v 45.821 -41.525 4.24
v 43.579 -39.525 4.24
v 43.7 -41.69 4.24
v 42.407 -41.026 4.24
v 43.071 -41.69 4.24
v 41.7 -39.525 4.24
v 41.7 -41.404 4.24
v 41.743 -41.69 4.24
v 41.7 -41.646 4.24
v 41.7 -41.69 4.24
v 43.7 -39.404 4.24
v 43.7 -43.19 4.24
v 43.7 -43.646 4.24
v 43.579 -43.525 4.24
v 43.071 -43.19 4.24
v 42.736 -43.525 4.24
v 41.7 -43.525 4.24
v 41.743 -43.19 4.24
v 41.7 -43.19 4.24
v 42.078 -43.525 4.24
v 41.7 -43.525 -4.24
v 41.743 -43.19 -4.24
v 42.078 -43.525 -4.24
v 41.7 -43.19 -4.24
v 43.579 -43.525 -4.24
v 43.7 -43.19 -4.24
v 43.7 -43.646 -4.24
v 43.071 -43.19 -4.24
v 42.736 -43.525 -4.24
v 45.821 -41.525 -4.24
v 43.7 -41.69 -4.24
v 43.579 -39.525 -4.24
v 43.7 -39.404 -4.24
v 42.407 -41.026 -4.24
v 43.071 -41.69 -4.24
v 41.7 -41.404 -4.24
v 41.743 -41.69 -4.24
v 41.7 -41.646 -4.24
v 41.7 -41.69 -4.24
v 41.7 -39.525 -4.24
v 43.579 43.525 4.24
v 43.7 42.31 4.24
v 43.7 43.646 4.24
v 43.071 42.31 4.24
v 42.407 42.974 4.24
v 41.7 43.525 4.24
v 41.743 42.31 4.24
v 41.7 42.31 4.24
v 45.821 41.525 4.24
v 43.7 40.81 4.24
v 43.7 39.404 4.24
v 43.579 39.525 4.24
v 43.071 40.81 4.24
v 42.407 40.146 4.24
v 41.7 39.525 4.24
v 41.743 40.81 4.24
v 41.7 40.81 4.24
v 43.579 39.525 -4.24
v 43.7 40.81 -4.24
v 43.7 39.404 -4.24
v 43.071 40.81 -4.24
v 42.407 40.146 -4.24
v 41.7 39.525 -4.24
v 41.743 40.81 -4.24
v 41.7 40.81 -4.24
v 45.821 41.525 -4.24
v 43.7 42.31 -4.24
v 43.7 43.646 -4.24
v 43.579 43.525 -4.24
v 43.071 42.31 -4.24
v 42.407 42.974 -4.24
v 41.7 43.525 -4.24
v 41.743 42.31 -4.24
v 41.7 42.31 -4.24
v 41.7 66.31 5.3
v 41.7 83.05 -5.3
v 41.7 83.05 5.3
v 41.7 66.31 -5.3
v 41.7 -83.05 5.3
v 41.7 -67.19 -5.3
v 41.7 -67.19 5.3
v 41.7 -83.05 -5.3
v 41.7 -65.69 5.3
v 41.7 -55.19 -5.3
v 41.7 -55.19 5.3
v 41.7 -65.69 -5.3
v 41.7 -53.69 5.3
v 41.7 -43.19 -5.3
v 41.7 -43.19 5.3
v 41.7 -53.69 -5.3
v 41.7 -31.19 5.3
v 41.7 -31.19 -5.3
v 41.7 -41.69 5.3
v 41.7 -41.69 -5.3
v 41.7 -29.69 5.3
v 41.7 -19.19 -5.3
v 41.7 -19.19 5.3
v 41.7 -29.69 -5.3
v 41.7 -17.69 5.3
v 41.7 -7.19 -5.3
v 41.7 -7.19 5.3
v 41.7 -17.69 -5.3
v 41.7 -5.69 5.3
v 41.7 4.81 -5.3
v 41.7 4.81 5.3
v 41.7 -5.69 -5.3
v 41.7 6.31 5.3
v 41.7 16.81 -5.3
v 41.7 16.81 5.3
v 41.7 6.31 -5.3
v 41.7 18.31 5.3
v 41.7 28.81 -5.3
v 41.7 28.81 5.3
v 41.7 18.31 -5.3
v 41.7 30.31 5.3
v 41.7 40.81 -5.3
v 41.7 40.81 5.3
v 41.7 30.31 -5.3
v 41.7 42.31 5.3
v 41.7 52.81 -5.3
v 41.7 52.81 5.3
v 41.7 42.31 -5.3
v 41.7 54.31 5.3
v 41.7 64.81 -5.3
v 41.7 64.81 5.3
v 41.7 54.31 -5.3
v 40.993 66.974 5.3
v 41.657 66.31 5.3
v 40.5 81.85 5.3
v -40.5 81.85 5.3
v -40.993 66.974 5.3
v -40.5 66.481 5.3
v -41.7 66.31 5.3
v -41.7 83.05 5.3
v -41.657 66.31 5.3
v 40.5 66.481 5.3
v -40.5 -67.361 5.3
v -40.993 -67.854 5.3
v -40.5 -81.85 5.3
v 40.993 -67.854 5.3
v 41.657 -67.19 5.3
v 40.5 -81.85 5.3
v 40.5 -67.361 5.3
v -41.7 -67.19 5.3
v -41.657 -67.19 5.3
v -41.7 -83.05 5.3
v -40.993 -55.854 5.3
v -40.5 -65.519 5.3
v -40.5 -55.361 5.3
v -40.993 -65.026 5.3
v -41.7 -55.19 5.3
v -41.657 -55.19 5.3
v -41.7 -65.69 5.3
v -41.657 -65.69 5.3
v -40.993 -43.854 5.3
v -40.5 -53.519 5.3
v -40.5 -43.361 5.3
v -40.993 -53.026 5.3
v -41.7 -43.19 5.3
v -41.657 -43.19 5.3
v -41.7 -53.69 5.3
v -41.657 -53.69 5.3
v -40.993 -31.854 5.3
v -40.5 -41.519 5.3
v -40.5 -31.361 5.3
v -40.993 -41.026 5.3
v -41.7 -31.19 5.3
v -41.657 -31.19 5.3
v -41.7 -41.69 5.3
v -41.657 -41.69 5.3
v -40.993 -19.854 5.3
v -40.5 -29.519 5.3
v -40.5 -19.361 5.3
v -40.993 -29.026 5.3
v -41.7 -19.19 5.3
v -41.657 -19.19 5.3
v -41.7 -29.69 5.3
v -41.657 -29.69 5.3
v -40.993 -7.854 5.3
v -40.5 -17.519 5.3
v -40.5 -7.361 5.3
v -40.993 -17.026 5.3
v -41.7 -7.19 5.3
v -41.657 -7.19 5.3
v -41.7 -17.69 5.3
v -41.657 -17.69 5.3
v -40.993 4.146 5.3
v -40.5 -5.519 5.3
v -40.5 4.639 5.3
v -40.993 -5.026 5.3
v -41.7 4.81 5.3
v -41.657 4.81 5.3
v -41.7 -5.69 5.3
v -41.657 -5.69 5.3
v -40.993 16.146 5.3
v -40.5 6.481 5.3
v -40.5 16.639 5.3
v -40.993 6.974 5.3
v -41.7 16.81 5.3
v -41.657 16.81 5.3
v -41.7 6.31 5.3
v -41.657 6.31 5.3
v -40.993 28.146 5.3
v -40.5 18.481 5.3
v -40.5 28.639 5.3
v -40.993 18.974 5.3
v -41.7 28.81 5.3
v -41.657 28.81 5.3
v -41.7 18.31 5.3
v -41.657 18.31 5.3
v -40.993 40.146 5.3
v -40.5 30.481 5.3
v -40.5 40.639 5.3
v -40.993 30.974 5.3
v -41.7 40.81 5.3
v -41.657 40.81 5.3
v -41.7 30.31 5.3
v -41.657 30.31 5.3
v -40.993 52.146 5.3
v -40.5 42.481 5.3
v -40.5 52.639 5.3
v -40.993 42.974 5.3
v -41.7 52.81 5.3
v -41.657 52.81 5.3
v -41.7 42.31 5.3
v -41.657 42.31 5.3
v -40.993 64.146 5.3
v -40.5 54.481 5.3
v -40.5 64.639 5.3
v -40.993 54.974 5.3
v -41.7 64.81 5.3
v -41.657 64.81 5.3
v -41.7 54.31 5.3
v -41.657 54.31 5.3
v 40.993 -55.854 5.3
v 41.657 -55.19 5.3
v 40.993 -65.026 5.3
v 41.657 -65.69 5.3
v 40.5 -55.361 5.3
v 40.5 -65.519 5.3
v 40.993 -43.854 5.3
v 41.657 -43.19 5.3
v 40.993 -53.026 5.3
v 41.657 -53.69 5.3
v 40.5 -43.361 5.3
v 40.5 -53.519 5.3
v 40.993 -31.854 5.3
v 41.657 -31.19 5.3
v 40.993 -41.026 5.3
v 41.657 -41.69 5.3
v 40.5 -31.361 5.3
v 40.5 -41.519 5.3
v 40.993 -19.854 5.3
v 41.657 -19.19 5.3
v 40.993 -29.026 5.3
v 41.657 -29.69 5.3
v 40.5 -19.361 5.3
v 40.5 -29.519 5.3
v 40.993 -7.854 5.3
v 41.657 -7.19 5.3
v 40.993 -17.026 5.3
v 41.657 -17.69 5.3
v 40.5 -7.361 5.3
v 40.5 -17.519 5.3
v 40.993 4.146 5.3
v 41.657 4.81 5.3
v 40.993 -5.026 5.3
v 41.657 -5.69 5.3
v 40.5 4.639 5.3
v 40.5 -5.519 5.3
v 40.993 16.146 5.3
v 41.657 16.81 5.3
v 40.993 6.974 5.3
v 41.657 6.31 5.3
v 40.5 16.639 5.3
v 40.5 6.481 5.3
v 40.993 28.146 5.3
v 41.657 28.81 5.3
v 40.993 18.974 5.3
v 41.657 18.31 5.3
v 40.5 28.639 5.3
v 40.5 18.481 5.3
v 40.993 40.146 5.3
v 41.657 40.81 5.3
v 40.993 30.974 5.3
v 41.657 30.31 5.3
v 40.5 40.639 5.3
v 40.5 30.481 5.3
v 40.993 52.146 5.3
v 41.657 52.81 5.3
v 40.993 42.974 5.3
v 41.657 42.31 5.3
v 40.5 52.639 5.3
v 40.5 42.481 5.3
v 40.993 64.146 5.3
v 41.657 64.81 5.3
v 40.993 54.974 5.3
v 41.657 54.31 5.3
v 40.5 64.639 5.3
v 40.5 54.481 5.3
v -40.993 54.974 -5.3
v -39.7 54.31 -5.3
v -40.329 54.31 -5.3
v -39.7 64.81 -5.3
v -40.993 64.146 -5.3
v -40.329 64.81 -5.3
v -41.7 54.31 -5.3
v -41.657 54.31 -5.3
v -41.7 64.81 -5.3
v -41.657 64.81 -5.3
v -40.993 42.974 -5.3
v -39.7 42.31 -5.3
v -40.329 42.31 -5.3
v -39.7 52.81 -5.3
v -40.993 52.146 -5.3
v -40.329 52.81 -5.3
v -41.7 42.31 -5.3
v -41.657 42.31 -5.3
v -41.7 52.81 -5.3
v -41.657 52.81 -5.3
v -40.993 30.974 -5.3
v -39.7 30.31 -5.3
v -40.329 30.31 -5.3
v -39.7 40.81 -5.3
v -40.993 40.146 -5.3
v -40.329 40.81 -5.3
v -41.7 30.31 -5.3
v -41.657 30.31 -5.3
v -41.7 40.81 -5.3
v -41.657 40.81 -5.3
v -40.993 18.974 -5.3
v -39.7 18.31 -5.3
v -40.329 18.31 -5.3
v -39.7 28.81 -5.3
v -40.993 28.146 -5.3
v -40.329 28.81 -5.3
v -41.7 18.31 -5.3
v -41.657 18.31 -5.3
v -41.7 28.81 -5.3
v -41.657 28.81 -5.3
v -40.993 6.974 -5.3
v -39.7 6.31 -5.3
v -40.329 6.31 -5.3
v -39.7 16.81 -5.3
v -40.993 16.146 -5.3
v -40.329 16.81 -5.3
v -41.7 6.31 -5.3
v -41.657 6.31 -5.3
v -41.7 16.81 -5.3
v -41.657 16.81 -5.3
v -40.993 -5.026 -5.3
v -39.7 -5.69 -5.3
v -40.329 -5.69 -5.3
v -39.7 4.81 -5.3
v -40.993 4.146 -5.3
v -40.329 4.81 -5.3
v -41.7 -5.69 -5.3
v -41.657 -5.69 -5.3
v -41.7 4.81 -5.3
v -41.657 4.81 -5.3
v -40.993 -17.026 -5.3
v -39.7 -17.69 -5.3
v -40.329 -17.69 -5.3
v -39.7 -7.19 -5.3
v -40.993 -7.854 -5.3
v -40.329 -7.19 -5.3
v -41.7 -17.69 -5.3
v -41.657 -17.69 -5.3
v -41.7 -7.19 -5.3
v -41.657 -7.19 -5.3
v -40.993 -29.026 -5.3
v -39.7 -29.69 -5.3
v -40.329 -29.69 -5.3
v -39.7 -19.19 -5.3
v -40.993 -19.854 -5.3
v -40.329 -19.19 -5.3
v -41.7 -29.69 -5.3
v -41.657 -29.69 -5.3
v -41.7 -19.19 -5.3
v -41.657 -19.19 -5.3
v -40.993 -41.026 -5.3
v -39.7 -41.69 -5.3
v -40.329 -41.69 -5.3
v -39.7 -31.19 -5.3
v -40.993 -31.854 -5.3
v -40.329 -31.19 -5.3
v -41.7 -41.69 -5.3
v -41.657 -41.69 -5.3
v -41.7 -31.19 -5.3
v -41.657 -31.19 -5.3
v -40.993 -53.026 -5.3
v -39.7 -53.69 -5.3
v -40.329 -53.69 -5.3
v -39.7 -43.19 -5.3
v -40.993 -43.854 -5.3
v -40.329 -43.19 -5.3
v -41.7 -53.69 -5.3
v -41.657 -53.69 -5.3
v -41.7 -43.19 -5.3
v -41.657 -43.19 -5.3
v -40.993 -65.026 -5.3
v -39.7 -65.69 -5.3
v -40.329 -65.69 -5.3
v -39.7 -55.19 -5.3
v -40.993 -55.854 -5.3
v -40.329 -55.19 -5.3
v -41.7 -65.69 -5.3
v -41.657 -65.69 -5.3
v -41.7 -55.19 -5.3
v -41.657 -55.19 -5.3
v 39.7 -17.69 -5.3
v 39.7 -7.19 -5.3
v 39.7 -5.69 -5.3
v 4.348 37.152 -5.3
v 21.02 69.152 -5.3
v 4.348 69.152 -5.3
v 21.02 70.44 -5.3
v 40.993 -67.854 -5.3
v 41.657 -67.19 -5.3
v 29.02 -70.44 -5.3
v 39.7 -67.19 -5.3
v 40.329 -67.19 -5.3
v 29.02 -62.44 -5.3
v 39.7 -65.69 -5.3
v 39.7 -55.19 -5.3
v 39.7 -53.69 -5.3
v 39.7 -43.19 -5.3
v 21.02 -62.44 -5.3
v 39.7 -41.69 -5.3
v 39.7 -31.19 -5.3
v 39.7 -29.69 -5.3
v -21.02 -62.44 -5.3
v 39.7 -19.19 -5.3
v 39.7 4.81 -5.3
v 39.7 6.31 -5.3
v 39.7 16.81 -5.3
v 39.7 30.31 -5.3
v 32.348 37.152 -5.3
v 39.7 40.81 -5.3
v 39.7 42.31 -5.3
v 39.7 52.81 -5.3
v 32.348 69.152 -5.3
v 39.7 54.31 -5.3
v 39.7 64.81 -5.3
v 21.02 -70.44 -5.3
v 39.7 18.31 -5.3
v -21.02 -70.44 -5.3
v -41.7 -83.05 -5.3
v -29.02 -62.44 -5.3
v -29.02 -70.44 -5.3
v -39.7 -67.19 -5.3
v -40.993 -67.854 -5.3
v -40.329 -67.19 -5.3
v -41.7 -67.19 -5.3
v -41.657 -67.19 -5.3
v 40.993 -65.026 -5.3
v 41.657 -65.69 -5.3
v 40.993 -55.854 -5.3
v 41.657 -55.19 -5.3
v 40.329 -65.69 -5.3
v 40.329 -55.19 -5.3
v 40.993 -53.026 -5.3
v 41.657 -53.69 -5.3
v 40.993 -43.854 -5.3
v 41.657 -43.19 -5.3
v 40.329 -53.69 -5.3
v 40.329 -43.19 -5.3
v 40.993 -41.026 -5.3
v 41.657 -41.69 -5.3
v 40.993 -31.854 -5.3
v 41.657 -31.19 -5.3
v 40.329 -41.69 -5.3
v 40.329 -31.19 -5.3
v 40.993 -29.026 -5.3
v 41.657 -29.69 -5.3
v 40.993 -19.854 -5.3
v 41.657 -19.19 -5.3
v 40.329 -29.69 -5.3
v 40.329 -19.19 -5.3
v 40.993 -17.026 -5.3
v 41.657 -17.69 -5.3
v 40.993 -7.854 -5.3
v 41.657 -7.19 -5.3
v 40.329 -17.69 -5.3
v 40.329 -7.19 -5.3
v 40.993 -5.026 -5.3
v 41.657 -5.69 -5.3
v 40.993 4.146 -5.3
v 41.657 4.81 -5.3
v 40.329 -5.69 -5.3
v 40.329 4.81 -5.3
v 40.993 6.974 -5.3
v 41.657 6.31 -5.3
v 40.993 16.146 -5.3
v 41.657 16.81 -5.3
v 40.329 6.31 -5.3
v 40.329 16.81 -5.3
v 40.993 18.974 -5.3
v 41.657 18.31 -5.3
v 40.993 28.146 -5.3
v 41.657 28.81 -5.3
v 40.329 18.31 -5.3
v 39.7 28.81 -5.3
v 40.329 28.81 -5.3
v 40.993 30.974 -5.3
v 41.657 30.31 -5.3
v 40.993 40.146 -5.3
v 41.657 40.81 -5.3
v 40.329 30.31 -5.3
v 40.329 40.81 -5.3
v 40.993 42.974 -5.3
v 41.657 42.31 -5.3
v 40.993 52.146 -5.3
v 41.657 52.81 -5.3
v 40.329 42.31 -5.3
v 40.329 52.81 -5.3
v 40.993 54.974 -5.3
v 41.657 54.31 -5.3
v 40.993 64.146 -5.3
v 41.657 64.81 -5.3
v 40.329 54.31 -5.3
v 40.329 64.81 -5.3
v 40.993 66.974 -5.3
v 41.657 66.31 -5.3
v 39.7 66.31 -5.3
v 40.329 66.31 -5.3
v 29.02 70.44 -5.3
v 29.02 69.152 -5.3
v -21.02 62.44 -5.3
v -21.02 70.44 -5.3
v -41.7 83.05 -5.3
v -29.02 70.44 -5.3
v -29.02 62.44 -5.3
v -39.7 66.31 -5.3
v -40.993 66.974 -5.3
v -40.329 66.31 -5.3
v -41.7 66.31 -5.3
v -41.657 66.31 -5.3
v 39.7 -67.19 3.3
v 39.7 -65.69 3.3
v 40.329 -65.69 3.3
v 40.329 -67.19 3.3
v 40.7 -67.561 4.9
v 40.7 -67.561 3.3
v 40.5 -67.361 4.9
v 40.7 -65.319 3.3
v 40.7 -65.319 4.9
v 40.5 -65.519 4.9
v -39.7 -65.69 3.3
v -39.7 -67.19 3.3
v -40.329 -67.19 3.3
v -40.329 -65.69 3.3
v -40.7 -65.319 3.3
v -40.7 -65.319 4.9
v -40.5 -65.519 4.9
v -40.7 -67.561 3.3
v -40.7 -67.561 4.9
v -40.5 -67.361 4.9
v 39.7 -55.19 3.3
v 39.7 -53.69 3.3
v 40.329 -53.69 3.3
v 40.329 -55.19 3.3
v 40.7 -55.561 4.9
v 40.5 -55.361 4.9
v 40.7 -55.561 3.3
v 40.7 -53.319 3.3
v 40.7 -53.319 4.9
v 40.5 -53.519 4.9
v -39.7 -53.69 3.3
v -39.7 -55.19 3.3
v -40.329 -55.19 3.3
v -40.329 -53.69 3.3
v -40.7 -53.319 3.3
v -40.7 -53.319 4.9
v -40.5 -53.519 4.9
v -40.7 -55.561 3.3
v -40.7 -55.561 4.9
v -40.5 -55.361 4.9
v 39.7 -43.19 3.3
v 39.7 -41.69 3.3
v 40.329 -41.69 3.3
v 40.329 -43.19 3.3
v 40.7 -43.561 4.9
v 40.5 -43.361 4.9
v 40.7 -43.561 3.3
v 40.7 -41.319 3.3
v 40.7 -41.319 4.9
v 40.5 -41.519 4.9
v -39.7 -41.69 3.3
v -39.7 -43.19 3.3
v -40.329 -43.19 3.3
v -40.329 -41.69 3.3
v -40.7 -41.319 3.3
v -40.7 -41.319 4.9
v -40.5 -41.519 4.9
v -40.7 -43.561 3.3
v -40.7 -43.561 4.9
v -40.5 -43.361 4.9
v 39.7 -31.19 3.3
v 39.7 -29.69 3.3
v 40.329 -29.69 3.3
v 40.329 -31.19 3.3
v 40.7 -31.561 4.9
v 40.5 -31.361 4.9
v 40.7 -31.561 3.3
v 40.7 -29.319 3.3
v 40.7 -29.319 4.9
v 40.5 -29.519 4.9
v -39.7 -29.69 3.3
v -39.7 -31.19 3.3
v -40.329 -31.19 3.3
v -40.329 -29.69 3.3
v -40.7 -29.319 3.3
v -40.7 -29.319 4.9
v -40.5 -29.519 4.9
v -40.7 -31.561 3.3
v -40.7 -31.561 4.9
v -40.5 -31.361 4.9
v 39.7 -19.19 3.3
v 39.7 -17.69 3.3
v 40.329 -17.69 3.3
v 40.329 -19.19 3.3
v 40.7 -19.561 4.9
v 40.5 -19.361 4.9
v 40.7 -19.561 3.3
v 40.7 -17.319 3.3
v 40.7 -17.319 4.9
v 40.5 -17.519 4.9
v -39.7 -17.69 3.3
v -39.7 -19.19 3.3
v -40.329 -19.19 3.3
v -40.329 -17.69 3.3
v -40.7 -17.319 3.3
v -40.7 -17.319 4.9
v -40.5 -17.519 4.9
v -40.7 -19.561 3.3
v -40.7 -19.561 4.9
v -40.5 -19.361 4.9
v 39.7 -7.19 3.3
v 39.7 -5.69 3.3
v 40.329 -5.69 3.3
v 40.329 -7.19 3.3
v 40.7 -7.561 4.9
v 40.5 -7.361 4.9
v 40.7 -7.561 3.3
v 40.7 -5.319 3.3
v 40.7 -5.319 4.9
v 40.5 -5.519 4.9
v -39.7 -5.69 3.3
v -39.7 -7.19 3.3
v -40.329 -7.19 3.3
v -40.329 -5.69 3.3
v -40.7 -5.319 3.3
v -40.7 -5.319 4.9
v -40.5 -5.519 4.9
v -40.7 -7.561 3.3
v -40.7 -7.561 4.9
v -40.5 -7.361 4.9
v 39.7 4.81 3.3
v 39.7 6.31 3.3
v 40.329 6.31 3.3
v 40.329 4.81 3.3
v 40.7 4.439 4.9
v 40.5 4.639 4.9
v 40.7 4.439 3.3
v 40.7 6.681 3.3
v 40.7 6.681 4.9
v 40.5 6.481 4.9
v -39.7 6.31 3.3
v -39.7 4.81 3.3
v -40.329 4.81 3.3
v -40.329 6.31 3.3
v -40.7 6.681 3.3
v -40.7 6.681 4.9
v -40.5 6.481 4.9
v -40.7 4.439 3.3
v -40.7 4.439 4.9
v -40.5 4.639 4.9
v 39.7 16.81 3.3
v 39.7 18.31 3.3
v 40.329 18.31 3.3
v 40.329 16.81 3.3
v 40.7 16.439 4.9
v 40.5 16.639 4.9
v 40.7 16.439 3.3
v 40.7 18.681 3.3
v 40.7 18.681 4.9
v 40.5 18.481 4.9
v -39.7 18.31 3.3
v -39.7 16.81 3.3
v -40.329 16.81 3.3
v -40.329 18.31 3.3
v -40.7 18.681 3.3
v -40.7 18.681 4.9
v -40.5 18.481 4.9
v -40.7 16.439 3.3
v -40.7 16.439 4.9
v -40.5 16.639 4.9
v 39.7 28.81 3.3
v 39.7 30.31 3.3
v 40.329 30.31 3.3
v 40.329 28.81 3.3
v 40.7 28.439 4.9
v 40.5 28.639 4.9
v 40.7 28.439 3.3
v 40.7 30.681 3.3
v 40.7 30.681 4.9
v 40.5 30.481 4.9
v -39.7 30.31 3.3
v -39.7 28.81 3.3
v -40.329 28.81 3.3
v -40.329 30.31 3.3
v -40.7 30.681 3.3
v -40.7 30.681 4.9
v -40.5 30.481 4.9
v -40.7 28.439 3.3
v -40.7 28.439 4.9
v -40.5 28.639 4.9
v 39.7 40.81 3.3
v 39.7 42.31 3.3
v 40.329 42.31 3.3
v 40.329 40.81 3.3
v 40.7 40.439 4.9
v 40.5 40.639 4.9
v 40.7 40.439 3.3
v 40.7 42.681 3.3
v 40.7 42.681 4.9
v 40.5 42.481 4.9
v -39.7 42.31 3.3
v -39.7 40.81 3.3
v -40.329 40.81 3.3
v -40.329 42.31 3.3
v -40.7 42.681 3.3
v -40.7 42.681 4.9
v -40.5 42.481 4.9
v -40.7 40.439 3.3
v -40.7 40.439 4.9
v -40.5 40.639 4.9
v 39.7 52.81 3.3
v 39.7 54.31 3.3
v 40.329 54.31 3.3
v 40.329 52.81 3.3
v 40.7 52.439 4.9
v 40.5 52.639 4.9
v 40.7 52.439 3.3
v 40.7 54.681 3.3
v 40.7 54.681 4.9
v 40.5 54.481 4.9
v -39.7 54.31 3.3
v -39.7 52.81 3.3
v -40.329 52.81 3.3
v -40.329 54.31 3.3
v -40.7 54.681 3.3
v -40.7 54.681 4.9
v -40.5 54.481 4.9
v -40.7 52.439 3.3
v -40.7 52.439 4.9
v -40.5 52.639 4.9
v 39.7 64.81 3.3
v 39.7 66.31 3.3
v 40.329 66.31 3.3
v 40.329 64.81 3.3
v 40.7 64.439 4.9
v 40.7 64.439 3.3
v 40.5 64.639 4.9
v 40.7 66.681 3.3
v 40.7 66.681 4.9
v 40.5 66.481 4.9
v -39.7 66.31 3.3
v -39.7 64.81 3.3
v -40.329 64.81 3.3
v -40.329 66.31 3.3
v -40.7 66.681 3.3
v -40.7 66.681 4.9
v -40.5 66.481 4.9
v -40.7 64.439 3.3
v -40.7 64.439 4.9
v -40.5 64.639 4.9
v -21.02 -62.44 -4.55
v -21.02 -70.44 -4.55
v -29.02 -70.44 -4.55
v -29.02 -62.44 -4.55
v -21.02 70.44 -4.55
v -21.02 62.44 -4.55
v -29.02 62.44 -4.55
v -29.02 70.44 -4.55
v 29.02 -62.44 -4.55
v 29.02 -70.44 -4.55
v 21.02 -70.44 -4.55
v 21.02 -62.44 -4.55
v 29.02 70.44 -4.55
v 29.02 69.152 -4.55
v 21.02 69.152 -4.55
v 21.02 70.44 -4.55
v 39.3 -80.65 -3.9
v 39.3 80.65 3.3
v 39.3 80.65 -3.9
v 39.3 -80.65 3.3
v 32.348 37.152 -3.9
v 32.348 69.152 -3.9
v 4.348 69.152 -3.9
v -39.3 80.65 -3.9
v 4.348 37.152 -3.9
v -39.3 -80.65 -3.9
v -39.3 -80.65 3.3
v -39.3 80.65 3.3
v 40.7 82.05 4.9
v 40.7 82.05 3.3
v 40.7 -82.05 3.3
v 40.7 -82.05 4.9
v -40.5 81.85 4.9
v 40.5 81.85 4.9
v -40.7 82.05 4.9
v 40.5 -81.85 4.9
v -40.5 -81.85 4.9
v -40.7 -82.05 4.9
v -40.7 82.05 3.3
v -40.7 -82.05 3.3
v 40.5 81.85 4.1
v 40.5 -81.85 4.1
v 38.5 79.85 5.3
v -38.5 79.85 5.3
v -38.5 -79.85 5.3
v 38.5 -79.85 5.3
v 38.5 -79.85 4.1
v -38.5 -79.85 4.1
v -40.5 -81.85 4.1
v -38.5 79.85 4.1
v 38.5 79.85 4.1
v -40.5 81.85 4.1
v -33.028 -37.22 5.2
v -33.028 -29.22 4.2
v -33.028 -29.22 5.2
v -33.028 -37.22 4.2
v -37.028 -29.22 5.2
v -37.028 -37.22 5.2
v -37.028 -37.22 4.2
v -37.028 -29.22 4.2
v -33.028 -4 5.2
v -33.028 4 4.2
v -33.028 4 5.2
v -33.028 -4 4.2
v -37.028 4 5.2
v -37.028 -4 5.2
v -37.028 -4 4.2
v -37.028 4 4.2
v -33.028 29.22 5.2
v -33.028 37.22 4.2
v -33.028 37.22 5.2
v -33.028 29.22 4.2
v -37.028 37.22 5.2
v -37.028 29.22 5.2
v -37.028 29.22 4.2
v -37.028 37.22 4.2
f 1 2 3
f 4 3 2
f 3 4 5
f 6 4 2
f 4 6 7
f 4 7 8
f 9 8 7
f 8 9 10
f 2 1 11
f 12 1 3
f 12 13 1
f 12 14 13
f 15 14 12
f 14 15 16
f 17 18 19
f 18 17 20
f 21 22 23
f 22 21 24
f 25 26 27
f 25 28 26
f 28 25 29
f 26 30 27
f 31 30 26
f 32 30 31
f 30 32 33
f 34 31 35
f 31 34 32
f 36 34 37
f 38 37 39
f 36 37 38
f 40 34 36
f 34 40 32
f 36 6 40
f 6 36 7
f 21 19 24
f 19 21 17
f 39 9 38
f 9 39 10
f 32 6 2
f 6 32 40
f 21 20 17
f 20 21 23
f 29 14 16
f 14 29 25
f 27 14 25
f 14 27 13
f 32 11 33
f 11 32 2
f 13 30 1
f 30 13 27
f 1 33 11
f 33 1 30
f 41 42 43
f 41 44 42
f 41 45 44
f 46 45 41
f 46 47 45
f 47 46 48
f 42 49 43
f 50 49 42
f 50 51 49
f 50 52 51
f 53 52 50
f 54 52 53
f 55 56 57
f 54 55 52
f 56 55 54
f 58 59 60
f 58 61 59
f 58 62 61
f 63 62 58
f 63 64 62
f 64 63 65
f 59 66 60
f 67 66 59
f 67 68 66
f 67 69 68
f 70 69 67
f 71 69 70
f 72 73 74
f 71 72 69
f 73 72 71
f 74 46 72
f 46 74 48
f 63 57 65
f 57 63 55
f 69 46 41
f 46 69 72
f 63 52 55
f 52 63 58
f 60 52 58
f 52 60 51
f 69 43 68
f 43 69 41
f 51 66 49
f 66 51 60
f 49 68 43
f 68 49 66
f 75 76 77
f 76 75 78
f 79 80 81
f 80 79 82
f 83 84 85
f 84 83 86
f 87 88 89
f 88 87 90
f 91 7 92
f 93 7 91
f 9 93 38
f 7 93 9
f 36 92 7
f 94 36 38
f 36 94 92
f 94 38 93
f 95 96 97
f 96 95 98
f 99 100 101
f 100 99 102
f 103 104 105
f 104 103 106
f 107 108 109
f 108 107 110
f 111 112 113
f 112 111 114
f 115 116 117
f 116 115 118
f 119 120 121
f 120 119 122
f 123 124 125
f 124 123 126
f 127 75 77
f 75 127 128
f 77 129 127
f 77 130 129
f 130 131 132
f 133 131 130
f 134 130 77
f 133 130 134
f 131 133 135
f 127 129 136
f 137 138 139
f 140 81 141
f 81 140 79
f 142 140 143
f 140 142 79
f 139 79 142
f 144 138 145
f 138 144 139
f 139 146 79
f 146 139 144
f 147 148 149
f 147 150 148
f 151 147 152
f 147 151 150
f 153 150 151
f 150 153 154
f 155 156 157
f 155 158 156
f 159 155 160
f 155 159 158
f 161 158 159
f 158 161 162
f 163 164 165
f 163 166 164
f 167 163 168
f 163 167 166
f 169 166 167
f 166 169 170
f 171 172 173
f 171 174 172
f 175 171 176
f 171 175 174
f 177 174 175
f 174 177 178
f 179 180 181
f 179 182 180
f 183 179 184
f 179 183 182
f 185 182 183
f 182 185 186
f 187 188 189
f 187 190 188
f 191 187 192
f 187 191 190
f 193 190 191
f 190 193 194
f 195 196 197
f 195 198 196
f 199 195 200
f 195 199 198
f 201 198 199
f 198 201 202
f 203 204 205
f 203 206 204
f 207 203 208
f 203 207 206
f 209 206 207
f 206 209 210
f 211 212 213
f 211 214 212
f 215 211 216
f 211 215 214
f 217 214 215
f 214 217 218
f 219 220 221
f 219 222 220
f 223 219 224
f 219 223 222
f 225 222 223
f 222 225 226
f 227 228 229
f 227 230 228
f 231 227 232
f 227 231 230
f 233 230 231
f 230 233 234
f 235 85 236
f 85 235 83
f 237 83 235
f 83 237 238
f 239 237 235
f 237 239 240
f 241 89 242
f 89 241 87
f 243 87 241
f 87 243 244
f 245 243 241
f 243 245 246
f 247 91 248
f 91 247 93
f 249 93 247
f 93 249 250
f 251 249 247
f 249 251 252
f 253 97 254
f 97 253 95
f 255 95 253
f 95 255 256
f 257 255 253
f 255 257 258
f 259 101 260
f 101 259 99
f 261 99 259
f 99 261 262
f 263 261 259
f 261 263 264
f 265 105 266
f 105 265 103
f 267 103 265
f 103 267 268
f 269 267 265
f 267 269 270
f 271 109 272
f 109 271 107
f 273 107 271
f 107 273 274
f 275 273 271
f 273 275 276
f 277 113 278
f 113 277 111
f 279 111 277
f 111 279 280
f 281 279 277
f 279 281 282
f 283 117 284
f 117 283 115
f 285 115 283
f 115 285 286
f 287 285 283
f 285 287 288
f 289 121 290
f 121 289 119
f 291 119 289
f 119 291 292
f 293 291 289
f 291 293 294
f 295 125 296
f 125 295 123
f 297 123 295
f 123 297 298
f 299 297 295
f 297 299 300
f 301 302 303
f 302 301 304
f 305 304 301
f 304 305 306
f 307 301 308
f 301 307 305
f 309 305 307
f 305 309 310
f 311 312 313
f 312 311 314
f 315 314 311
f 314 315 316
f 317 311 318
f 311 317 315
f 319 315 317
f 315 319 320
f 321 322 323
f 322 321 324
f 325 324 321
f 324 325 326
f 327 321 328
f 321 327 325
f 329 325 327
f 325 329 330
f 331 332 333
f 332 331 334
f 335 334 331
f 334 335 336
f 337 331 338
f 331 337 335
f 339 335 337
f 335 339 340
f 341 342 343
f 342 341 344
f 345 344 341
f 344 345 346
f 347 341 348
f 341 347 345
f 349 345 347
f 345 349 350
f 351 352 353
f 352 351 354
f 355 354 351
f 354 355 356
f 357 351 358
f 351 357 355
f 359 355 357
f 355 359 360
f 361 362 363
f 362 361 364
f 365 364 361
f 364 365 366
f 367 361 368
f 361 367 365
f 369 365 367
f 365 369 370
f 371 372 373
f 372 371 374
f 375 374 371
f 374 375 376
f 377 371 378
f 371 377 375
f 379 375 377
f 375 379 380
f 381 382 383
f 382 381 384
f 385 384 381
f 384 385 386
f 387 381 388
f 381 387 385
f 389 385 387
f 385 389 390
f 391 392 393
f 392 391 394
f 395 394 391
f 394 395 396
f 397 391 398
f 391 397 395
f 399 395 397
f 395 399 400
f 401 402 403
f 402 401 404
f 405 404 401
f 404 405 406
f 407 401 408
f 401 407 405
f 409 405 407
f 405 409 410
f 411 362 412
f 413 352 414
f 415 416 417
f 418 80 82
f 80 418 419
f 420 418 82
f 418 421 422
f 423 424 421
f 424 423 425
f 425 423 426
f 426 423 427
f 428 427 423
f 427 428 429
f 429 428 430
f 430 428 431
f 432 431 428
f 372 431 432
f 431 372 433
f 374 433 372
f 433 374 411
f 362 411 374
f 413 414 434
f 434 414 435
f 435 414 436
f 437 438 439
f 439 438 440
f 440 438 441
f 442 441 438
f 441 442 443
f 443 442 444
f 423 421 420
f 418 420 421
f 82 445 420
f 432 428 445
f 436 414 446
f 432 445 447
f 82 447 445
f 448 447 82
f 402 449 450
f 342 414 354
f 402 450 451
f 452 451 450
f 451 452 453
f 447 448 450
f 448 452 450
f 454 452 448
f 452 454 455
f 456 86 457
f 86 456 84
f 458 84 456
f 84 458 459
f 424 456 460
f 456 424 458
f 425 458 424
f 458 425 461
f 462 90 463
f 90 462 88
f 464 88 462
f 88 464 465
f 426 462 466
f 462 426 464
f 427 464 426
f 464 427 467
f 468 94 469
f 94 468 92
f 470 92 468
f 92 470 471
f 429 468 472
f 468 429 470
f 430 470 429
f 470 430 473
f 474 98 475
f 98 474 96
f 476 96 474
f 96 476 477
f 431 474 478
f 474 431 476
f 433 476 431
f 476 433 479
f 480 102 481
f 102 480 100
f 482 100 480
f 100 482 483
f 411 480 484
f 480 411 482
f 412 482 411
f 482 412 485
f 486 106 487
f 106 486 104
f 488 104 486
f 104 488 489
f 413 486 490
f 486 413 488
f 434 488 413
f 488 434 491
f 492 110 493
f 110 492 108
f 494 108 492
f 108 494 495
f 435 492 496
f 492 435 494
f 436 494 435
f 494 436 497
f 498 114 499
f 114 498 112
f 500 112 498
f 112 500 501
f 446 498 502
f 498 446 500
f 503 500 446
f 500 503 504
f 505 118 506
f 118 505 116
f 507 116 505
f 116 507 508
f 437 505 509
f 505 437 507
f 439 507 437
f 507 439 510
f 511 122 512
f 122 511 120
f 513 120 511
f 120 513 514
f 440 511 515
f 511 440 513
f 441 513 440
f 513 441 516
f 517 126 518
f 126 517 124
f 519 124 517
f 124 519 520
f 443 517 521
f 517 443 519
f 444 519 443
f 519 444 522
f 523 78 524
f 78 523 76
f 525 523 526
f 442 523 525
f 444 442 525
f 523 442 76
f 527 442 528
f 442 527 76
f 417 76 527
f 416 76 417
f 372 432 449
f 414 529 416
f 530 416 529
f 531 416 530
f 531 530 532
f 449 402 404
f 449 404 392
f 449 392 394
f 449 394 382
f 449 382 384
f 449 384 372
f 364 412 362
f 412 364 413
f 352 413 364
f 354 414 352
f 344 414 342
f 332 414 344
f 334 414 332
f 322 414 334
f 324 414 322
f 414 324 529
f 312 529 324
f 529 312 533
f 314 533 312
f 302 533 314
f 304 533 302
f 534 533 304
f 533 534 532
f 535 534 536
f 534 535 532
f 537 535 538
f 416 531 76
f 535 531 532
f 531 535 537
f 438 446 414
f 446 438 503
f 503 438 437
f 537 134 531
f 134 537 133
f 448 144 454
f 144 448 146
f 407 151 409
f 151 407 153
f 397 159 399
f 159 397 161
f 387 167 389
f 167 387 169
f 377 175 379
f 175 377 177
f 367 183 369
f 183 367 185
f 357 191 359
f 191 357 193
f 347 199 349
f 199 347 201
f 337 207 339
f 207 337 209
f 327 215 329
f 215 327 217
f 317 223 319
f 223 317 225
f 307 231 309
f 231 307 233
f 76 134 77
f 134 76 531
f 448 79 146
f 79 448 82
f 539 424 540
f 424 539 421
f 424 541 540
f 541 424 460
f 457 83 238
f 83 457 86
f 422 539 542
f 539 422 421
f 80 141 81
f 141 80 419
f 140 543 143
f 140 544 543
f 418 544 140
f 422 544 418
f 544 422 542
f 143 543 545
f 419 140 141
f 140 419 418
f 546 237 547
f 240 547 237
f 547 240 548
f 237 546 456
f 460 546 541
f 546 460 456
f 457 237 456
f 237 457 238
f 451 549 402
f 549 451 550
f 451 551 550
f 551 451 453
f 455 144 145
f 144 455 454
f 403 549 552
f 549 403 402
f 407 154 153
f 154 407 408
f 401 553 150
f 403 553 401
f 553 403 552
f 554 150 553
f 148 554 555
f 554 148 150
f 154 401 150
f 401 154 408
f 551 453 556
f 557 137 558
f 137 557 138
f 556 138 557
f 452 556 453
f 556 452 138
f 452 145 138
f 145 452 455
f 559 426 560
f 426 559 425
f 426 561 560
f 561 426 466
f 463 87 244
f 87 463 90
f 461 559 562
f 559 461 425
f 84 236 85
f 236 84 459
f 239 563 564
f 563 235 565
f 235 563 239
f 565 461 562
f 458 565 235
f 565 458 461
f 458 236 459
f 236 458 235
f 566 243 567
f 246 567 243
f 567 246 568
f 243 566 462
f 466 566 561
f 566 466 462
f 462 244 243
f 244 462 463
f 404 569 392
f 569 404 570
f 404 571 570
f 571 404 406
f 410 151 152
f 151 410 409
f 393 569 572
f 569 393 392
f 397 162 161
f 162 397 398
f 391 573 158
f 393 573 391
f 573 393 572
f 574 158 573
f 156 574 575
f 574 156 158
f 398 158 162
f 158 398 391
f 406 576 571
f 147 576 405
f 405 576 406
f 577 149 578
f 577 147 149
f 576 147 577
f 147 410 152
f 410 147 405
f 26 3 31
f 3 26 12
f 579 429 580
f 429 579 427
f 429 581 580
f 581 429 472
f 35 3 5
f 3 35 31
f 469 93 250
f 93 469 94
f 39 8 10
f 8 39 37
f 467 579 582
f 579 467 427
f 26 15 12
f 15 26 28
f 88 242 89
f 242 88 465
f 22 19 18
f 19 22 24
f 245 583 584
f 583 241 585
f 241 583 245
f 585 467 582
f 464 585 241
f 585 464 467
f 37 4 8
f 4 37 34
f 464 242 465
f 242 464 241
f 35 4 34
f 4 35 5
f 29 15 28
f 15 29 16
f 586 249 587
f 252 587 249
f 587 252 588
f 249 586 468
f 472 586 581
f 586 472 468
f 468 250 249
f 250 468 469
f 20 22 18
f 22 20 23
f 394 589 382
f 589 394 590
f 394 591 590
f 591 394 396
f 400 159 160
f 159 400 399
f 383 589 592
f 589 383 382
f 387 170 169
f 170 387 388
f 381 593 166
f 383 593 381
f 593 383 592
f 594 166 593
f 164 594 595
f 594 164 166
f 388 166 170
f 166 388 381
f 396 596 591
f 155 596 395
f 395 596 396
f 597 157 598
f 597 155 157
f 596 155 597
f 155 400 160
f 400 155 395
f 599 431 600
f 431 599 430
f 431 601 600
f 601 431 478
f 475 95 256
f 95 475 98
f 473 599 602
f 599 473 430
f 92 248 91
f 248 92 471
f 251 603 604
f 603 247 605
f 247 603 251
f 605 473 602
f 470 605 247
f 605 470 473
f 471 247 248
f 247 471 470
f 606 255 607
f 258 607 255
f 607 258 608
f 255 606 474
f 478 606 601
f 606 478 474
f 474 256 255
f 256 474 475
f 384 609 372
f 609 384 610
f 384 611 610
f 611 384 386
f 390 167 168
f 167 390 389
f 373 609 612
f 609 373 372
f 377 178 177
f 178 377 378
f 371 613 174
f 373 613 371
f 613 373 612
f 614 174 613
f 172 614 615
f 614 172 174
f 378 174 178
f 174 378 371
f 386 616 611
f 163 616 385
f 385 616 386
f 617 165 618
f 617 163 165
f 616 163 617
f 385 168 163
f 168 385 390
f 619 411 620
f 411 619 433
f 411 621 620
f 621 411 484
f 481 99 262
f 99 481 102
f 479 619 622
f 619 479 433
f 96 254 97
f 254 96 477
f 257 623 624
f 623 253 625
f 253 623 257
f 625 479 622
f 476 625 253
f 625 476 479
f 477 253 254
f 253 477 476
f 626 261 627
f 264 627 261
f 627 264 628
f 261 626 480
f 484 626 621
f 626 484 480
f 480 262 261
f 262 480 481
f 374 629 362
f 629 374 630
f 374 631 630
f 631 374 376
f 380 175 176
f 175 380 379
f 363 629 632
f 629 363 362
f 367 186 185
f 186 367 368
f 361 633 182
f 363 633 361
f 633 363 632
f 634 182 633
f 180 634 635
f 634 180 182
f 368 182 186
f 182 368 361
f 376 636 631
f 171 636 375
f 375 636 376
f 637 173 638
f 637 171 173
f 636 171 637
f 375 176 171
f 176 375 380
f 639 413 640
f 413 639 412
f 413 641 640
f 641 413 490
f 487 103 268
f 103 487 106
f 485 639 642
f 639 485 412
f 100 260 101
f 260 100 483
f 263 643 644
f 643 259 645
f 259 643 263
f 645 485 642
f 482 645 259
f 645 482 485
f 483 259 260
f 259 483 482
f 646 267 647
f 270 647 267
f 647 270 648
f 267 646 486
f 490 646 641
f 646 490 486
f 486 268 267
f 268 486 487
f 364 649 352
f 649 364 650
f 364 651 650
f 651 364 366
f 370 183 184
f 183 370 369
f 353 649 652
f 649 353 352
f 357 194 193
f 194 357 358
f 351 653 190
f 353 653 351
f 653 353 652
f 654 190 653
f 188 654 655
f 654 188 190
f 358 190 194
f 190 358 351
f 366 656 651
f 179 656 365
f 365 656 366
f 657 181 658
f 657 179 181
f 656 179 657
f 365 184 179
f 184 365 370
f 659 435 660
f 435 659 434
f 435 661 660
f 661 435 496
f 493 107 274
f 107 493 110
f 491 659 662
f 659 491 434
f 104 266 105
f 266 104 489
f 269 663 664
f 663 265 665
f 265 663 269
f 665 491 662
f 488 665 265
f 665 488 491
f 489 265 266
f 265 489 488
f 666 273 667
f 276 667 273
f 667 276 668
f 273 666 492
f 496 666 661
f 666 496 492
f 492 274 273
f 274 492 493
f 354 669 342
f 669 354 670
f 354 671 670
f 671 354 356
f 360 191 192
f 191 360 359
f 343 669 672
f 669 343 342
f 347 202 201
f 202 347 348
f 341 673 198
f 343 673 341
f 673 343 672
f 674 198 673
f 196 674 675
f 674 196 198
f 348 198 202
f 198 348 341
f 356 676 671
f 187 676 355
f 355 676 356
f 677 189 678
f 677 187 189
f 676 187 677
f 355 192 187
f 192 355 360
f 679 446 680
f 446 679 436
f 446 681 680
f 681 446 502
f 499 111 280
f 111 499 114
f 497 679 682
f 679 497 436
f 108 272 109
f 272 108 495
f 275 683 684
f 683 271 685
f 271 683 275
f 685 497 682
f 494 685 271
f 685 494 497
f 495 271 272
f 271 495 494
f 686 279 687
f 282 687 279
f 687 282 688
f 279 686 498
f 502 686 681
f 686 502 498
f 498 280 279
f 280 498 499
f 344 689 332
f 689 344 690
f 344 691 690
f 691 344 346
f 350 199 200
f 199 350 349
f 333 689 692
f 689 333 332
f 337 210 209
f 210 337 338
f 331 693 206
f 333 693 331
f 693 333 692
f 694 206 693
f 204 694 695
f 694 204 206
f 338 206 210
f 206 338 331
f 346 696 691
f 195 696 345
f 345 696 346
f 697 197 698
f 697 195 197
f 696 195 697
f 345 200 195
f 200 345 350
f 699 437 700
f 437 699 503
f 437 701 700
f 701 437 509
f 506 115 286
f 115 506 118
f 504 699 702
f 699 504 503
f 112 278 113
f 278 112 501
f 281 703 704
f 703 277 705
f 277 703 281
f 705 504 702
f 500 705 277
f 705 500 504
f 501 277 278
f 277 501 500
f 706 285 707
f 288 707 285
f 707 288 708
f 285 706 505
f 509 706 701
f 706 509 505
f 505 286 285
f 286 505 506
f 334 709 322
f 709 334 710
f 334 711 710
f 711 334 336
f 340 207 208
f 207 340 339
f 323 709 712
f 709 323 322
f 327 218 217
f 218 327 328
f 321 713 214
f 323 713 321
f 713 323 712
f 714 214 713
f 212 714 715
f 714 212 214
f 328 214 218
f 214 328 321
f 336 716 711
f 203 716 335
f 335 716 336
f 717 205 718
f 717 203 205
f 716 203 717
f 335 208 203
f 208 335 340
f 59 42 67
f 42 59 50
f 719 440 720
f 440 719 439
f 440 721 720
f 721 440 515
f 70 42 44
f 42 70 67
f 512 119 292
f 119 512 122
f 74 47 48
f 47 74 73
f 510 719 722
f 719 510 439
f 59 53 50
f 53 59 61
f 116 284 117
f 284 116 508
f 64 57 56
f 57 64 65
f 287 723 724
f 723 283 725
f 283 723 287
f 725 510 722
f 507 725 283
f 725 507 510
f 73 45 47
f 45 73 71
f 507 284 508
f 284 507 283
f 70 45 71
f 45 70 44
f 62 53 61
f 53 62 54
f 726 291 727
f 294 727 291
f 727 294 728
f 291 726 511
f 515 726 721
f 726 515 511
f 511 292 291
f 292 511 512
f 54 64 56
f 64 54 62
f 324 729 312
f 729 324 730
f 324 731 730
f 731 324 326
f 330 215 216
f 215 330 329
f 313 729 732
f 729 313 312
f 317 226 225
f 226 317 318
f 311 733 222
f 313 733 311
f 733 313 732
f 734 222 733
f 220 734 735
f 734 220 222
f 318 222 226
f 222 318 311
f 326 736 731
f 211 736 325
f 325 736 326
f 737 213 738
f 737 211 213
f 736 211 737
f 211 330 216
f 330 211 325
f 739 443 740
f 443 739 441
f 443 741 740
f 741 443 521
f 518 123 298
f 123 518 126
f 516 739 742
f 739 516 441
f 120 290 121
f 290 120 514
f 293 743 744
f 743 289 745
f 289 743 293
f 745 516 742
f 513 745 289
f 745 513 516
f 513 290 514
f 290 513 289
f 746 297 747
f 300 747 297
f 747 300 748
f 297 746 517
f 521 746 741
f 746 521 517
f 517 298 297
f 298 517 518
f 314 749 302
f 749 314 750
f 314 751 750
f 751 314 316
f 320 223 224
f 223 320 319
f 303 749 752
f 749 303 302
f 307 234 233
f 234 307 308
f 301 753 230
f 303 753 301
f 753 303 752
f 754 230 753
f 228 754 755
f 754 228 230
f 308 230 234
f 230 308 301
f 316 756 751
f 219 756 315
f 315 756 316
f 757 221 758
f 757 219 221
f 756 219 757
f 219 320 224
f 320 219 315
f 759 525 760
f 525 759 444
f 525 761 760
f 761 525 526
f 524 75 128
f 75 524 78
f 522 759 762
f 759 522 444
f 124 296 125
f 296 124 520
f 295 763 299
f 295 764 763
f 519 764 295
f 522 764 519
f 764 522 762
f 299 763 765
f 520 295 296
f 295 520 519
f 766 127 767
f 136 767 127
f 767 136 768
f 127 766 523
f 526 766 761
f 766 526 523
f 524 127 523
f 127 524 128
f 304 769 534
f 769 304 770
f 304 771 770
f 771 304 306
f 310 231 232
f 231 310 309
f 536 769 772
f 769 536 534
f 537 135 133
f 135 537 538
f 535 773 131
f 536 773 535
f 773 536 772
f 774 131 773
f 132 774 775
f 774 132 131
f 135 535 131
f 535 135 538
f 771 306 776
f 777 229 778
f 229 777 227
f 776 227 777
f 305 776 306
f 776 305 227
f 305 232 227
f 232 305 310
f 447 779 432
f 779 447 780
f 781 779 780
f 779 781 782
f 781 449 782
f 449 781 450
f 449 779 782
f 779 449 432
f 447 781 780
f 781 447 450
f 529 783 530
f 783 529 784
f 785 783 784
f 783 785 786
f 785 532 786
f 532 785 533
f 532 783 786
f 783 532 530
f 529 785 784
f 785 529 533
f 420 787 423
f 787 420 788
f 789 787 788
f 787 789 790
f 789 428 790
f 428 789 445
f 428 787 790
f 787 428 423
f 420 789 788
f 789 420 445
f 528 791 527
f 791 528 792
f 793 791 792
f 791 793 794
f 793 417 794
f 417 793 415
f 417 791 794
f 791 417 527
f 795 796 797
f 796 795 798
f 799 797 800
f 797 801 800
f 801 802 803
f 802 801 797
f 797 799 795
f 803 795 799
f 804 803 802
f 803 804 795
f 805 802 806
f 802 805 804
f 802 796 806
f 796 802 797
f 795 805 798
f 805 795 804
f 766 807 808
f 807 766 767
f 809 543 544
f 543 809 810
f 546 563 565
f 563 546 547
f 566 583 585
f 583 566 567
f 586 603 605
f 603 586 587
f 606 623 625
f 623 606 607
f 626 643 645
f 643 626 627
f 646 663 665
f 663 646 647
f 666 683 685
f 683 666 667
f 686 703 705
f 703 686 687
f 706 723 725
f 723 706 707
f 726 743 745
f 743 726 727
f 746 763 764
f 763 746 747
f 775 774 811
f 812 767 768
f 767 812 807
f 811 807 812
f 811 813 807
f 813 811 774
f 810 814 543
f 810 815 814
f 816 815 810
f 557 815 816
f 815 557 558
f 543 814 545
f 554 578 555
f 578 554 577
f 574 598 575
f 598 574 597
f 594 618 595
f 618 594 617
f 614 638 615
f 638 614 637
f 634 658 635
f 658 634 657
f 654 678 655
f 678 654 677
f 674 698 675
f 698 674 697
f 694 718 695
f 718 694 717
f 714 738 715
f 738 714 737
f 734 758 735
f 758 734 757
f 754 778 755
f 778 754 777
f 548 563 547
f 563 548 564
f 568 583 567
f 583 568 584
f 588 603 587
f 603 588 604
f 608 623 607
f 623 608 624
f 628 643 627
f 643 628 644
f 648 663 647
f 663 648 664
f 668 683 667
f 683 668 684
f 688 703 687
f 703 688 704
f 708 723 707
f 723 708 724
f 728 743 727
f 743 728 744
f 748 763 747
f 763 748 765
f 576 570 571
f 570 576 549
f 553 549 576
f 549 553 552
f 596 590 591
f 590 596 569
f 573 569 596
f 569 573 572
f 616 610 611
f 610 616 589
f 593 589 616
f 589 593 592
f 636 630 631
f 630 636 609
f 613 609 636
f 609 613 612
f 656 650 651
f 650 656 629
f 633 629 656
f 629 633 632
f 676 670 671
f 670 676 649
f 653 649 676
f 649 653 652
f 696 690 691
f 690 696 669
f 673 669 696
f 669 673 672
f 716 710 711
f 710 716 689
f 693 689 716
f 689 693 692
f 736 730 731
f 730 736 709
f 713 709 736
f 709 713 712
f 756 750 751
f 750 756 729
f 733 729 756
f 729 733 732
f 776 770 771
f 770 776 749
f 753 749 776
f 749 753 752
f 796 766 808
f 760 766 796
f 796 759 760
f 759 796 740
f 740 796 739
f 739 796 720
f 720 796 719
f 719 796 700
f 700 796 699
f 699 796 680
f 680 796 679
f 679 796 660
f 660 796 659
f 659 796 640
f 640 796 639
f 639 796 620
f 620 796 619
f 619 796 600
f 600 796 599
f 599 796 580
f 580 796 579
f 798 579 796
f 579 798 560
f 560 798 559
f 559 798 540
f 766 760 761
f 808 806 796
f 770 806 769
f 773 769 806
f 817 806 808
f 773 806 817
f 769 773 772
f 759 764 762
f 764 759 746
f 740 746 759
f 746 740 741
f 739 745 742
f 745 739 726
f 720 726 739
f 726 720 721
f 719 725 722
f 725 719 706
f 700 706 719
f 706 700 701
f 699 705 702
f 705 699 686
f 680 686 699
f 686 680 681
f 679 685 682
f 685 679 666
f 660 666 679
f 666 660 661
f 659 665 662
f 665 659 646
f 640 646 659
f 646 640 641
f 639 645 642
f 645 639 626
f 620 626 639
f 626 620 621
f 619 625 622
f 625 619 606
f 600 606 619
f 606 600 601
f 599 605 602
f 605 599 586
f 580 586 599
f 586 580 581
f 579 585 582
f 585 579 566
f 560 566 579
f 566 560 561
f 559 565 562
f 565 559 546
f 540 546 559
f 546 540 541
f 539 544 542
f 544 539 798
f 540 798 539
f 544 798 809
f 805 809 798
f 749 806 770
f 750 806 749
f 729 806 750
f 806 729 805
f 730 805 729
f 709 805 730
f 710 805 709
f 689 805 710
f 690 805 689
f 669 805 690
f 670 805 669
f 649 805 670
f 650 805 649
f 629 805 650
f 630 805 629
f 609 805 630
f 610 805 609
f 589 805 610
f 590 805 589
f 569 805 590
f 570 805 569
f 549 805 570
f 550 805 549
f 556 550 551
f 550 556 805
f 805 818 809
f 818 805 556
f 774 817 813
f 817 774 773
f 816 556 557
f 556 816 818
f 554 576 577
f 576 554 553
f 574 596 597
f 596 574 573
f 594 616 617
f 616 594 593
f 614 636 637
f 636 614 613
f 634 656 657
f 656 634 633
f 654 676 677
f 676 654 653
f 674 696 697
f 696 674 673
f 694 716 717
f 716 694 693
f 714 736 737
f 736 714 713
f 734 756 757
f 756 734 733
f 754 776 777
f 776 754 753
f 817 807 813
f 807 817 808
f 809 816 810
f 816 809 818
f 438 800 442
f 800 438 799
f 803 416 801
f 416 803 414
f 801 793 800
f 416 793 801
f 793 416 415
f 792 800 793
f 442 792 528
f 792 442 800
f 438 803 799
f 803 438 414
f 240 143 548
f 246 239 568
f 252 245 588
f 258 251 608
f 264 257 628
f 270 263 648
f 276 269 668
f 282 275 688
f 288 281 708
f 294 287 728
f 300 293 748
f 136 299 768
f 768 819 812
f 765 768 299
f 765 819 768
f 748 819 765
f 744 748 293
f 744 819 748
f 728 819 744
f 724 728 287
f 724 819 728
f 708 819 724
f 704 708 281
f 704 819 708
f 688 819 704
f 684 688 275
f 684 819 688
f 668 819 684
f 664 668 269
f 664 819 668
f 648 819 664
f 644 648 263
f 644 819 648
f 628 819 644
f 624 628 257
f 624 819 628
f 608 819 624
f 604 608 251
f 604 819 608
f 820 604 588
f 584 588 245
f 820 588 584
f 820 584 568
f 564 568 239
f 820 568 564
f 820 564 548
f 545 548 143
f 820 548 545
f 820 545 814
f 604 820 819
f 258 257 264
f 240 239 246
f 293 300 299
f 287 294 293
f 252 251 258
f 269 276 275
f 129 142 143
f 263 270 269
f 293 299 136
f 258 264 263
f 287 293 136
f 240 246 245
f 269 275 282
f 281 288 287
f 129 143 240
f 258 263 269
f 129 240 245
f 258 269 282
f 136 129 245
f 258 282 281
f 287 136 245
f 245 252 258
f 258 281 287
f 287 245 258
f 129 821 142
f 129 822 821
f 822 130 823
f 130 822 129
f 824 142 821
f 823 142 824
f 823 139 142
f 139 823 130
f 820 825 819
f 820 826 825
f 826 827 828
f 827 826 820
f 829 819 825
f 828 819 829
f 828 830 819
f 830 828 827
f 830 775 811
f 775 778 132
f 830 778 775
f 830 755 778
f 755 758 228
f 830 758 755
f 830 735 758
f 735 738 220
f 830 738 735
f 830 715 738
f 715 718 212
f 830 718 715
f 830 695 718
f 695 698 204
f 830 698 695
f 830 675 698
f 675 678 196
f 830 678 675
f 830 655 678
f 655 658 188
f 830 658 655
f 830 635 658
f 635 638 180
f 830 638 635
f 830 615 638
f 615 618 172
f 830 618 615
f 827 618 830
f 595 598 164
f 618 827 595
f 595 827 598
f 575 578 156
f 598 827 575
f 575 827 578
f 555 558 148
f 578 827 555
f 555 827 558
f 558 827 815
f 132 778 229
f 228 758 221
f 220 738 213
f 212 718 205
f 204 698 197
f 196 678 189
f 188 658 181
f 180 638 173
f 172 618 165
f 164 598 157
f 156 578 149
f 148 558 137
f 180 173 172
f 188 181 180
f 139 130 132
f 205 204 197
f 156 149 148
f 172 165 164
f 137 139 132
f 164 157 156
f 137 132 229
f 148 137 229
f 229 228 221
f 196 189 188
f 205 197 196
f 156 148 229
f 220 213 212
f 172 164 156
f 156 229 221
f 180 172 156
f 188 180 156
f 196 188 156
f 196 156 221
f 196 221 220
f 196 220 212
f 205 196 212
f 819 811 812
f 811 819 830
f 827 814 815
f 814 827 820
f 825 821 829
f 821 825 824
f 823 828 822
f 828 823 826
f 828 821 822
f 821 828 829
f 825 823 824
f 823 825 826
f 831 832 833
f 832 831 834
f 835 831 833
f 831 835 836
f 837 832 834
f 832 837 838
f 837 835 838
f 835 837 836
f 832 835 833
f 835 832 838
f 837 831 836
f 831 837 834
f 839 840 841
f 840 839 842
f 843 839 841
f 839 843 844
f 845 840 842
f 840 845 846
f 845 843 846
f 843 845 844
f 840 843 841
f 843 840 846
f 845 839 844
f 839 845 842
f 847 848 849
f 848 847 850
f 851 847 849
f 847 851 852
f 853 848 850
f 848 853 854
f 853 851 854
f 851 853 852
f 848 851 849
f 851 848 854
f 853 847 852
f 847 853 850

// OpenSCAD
// Matrix Biomimetic Utilities - Independent Consumer Smart Case Engine
// Version 3.0.0-Production Master | Dovetail Interlocks & Modular Snap-Rail Core

// ============================================================================
// 🏛️ PHONE MODEL GEOMETRY MATRIX (Adjust to modify target device dimensions)
// ============================================================================
PHONE_X = 78.1;            // Target smartphone width clearance (mm)
PHONE_Y = 160.8;           // Target smartphone height clearance (mm)
PHONE_Z = 7.8;             // Target smartphone thickness clearance (mm)
SHELL_WALL = 2.4;          // 2.4mm thick high-density perimeter barrier wall [1.1]

// ============================================================================
// 📐 RECONCILIATION & TOLERANCE ARRAYS (Compensates for Shrinkage)
// ============================================================================
INT_X = PHONE_X + 0.5;     
INT_Y = PHONE_Y + 0.5;
INT_Z = PHONE_Z + 0.4;

CASE_X = INT_X + (SHELL_WALL * 2);
CASE_Y = INT_Y + (SHELL_WALL * 2);
CASE_H = INT_Z + SHELL_WALL;

$fn = 60; // Curvature resolution factor for flawless hand ergonomics

// PART_SELECTOR: 0 = Full Visual Preview, 1 = Flexible TPU Outer Bumper, 2 = Rigid ASA Snap-In Rails
PART_SELECTOR = 0;

if (PART_SELECTOR == 0) {
    color("Charcoal") Smart_Case_Auxetic_Bumper();
    translate([0, 0, (CASE_H/2) - 0.6]) color("DimGray") Rigid_ASA_Snap_Rails();
} else if (PART_SELECTOR == 1) {
    Smart_Case_Auxetic_Bumper();
} else if (PART_SELECTOR == 2) {
    Rigid_ASA_Snap_Rails();
}

module Smart_Case_Auxetic_Bumper() {
    difference() {
        union() {
            // PRIMARY ERGONOMIC BUMPER (Printed in flexible high-rebound TPU)
            cube([CASE_X, CASE_Y, CASE_H], center=true);
            
            // BIOMIMETIC T-SLOT DOVETAIL INTERLOCKS
            // Replaces expensive magnets with wear-free mechanical puzzle joints
            for (y_ext = [-CASE_Y*0.25, CASE_Y*0.25]) {
                translate([CASE_X*0.5, y_ext, 0]) Armadillo_Dovetail_Male();
            }
        }
        
        // INNER PHONE INGESTION CAVITY
        translate([0, 0, SHELL_WALL * 0.5])
            cube([INT_X, INT_Y, INT_Z + 2.0], center=true);
            
        // THE BIOMIMETIC AUXETIC ARROWHEAD GRID
        for (y_step = [-CASE_Y*0.4 : 12 : CASE_Y*0.4]) {
            translate([CASE_X*0.5, y_step, 0]) rotate([0,0,0]) Auxetic_Cutout_Cell();
            translate([-CASE_X*0.5, y_step, 0]) rotate([0,0,180]) Auxetic_Cutout_Cell();
        }
        
        // INTERNAL SNAP-IN RAIL CHANNEL SUBTRACTION
        // Open tracks to receive the rigid ASA slide infrastructure
        translate([0, 0, (CASE_H/2) - 1.2])
            cube([CASE_X - 2.0, CASE_Y - 2.0, 1.6], center=true);
            
        // RIGID DESK-INTERFACE SOLID-BORNE FOOTPAD SLOTS
        // Connects desk vibrations directly to the internal tracking membrane
        for (x_foot = [-CASE_X*0.3, CASE_X*0.3], y_foot = [-CASE_Y*0.4, CASE_Y*0.4]) {
            translate([x_foot, y_foot, -CASE_H*0.5])
                cube([8.0, 8.0, 1.5], center=true);
        }
        
        // Camera Cutout Window
        translate([CASE_X*0.22, CASE_Y*0.32, -5.0])
            cube([28.0, 32.0, 20.0], center=true);
    }
}

module Rigid_ASA_Snap_Rails() {
    // Rigid internal framework strips that house the 40:1 rocker arms supportless
    difference() {
        cube([CASE_X - 2.4, CASE_Y - 2.4, 1.2], center=true);
        translate([0, 0, -0.1])
            cube([CASE_X - 6.4, CASE_Y - 6.4, 2.0], center=true);
    }
    
    // BIOMIMETIC ASYMMETRICAL ORMIA LEVER FULCRUMS
    // Amplifies low-frequency solid-borne desk hums up to a concentrated 40:1 mechanical pinch
    for (y_pivot = [-CASE_Y*0.2, 0, CASE_Y*0.2]) {
        translate([-CASE_X*0.42, y_pivot, 0])
            cube([4.0, 8.0, 1.0], center=true);
    }
}

module Armadillo_Dovetail_Male() {
    // T-Slot male slider node provides permanent mechanical locking with zero magnet overhead
    translate([1.0, 0, 0]) {
        cube([2.0, 4.0, CASE_H * 0.8], center=true);
        translate([1.0, 0, 0])
            rotate([0,0,45])
                cube([3.0, 3.0, CASE_H * 0.8], center=true);
    }
}

module Auxetic_Cutout_Cell() {
    union() {
        cube([4.0, 1.5, CASE_H + 2], center=true);
        rotate([0,0,45]) cube([3.0, 1.0, CASE_H + 2], center=true);
        rotate([0,0,-45]) cube([3.0, 1.0, CASE_H + 2], center=true);
    }
}
